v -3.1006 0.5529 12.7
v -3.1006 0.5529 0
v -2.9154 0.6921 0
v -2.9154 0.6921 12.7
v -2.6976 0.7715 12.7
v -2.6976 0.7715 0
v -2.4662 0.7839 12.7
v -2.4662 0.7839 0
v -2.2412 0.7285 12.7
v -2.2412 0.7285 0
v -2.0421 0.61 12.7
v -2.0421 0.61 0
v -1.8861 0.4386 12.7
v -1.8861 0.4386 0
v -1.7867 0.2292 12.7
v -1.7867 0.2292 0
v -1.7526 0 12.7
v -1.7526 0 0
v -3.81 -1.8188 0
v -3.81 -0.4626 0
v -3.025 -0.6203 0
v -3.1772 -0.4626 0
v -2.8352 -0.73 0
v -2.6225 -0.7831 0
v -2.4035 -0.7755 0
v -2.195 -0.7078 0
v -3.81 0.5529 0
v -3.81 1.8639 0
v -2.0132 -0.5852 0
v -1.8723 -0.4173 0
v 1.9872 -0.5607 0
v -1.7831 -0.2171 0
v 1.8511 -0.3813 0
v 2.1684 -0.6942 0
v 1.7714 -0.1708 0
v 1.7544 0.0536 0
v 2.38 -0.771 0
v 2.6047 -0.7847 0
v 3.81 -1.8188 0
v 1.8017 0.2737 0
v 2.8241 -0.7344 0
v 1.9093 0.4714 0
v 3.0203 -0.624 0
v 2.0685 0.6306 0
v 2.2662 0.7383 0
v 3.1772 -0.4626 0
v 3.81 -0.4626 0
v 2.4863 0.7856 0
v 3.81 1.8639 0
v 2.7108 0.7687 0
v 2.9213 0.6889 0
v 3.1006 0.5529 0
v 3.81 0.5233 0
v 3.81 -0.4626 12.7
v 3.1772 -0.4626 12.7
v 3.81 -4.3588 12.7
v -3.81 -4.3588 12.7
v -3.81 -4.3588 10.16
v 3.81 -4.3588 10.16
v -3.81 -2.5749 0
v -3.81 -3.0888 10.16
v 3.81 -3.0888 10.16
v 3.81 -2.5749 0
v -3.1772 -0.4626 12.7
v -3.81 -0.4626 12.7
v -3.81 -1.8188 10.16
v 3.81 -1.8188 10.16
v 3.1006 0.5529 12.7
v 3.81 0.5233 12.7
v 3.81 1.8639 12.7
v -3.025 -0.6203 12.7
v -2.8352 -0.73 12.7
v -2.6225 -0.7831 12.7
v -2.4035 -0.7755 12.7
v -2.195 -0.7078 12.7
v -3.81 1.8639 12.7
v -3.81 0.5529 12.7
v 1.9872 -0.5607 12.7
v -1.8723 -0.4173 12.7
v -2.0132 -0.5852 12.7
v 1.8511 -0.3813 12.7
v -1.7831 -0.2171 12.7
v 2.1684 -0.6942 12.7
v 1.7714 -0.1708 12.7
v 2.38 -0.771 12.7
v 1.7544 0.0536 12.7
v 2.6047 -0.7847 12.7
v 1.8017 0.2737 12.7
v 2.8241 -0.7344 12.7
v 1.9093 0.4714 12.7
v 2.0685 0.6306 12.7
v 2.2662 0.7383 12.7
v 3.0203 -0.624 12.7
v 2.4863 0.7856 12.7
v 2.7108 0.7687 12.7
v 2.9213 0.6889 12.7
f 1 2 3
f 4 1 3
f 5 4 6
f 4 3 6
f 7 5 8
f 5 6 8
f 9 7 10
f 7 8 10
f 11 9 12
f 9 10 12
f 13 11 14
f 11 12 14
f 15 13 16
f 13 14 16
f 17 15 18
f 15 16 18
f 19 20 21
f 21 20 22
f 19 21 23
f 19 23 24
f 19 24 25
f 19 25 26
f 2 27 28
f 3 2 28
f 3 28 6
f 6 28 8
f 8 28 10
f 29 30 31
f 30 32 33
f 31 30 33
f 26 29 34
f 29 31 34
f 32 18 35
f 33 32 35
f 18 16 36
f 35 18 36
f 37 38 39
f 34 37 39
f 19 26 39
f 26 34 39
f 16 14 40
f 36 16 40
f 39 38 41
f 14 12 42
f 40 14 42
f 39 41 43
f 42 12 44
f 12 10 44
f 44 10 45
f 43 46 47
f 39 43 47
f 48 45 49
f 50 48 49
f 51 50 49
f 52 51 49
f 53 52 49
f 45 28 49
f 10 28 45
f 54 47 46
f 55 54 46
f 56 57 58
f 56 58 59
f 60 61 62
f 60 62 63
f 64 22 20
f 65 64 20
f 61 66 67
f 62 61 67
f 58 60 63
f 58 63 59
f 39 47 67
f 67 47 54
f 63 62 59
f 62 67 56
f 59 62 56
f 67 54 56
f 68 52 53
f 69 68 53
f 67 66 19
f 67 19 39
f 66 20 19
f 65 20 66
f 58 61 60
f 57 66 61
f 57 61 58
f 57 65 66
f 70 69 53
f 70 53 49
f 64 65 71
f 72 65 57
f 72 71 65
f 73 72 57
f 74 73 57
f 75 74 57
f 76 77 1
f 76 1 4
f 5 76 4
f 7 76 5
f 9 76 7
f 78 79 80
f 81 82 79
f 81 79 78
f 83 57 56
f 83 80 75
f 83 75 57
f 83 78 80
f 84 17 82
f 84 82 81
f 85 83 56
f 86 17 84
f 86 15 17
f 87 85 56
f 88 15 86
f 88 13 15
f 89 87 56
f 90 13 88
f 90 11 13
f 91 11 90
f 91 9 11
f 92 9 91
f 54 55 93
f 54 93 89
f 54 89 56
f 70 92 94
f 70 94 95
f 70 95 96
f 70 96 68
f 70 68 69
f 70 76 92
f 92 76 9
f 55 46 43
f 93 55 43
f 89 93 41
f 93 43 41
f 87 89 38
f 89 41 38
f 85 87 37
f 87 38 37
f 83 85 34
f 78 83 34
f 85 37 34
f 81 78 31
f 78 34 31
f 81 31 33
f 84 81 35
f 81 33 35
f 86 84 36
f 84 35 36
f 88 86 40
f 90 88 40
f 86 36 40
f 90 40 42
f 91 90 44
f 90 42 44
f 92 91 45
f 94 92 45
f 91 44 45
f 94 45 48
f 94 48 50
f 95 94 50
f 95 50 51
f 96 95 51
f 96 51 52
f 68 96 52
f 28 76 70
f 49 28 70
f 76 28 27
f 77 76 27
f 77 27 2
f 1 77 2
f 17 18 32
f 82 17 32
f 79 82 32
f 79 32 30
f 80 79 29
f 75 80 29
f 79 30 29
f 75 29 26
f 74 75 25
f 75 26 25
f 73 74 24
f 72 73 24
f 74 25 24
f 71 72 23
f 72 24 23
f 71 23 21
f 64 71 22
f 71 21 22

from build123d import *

# Parameters (mm, degrees)
F1_DEPTH = 12.7
F2_W     = 7.62
F2_H     = 1.3110580664
F2_H_2   = 1.3562226996
F3_DEPTH = 25.4
F4_W     = 7.62
F4_H     = 2.54
F5_DEPTH = 2.54
F7_DEPTH = 7.62


with BuildPart() as f1:
    # F0 (on Top) → F1 (new body)
    with BuildSketch(Plane.XY):
        with BuildLine():
            Line((-3.81, -0.4625546008), (-3.81, -3.175))
            Line((-3.81, -3.175), (3.81, -3.175))
            Line((3.81, -3.175), (3.81, -0.4625546008))
            Line((3.81, -0.4625546008), (3.1772142507, -0.4625546008))
            ThreePointArc((3.1772142507, -0.4625546008), (1.754829289, -0.0592090754), (3.1006408738, 0.5528838672))
            Line((3.1006408738, 0.5528838672), (3.81, 0.523305399))
            Line((3.81, 0.523305399), (3.81, 3.175))
            Line((3.81, 3.175), (-3.81, 3.175))
            Line((-3.81, 3.175), (-3.81, 0.5528838672))
            Line((-3.81, 0.5528838672), (-3.1006408738, 0.5528838672))
            ThreePointArc((-3.1006408738, 0.5528838672), (-2.2412106629, 0.7285078531), (-1.7526, 0))
            ThreePointArc((-1.7526, 0), (-2.2968372366, -0.7489129659), (-3.1772142507, -0.4625546008))
            Line((-3.1772142507, -0.4625546008), (-3.81, -0.4625546008))
        make_face()
    extrude(amount=F1_DEPTH)

    # F2 (on face) → F3 (cut)
    with BuildSketch(Plane.XY.offset(12.7)):
        with Locations((0, 2.5194709668)):
            Rectangle(F2_W, F2_H)
        with Locations((0, -2.4968886502)):
            Rectangle(F2_W, F2_H_2)
    extrude(amount=-F3_DEPTH, mode=Mode.SUBTRACT)

    # F4 (on face) → F5 (join)
    with BuildSketch(Plane.XZ.offset(1.8187773004)):
        with Locations((0, 11.43)):
            Rectangle(F4_W, F4_H)
    extrude(amount=F5_DEPTH)

    # F6 (on face) → F7 (join)
    with BuildSketch(Plane(origin=(-3.81, 0, 0), x_dir=(0, -1, 0), z_dir=(-1, 0, 0))):
        Polygon((3.0887773004, 10.16), (2.5749250781, 0), (4.3587773004, 10.16), align=None)
    extrude(amount=-F7_DEPTH)


solid = f1.part
